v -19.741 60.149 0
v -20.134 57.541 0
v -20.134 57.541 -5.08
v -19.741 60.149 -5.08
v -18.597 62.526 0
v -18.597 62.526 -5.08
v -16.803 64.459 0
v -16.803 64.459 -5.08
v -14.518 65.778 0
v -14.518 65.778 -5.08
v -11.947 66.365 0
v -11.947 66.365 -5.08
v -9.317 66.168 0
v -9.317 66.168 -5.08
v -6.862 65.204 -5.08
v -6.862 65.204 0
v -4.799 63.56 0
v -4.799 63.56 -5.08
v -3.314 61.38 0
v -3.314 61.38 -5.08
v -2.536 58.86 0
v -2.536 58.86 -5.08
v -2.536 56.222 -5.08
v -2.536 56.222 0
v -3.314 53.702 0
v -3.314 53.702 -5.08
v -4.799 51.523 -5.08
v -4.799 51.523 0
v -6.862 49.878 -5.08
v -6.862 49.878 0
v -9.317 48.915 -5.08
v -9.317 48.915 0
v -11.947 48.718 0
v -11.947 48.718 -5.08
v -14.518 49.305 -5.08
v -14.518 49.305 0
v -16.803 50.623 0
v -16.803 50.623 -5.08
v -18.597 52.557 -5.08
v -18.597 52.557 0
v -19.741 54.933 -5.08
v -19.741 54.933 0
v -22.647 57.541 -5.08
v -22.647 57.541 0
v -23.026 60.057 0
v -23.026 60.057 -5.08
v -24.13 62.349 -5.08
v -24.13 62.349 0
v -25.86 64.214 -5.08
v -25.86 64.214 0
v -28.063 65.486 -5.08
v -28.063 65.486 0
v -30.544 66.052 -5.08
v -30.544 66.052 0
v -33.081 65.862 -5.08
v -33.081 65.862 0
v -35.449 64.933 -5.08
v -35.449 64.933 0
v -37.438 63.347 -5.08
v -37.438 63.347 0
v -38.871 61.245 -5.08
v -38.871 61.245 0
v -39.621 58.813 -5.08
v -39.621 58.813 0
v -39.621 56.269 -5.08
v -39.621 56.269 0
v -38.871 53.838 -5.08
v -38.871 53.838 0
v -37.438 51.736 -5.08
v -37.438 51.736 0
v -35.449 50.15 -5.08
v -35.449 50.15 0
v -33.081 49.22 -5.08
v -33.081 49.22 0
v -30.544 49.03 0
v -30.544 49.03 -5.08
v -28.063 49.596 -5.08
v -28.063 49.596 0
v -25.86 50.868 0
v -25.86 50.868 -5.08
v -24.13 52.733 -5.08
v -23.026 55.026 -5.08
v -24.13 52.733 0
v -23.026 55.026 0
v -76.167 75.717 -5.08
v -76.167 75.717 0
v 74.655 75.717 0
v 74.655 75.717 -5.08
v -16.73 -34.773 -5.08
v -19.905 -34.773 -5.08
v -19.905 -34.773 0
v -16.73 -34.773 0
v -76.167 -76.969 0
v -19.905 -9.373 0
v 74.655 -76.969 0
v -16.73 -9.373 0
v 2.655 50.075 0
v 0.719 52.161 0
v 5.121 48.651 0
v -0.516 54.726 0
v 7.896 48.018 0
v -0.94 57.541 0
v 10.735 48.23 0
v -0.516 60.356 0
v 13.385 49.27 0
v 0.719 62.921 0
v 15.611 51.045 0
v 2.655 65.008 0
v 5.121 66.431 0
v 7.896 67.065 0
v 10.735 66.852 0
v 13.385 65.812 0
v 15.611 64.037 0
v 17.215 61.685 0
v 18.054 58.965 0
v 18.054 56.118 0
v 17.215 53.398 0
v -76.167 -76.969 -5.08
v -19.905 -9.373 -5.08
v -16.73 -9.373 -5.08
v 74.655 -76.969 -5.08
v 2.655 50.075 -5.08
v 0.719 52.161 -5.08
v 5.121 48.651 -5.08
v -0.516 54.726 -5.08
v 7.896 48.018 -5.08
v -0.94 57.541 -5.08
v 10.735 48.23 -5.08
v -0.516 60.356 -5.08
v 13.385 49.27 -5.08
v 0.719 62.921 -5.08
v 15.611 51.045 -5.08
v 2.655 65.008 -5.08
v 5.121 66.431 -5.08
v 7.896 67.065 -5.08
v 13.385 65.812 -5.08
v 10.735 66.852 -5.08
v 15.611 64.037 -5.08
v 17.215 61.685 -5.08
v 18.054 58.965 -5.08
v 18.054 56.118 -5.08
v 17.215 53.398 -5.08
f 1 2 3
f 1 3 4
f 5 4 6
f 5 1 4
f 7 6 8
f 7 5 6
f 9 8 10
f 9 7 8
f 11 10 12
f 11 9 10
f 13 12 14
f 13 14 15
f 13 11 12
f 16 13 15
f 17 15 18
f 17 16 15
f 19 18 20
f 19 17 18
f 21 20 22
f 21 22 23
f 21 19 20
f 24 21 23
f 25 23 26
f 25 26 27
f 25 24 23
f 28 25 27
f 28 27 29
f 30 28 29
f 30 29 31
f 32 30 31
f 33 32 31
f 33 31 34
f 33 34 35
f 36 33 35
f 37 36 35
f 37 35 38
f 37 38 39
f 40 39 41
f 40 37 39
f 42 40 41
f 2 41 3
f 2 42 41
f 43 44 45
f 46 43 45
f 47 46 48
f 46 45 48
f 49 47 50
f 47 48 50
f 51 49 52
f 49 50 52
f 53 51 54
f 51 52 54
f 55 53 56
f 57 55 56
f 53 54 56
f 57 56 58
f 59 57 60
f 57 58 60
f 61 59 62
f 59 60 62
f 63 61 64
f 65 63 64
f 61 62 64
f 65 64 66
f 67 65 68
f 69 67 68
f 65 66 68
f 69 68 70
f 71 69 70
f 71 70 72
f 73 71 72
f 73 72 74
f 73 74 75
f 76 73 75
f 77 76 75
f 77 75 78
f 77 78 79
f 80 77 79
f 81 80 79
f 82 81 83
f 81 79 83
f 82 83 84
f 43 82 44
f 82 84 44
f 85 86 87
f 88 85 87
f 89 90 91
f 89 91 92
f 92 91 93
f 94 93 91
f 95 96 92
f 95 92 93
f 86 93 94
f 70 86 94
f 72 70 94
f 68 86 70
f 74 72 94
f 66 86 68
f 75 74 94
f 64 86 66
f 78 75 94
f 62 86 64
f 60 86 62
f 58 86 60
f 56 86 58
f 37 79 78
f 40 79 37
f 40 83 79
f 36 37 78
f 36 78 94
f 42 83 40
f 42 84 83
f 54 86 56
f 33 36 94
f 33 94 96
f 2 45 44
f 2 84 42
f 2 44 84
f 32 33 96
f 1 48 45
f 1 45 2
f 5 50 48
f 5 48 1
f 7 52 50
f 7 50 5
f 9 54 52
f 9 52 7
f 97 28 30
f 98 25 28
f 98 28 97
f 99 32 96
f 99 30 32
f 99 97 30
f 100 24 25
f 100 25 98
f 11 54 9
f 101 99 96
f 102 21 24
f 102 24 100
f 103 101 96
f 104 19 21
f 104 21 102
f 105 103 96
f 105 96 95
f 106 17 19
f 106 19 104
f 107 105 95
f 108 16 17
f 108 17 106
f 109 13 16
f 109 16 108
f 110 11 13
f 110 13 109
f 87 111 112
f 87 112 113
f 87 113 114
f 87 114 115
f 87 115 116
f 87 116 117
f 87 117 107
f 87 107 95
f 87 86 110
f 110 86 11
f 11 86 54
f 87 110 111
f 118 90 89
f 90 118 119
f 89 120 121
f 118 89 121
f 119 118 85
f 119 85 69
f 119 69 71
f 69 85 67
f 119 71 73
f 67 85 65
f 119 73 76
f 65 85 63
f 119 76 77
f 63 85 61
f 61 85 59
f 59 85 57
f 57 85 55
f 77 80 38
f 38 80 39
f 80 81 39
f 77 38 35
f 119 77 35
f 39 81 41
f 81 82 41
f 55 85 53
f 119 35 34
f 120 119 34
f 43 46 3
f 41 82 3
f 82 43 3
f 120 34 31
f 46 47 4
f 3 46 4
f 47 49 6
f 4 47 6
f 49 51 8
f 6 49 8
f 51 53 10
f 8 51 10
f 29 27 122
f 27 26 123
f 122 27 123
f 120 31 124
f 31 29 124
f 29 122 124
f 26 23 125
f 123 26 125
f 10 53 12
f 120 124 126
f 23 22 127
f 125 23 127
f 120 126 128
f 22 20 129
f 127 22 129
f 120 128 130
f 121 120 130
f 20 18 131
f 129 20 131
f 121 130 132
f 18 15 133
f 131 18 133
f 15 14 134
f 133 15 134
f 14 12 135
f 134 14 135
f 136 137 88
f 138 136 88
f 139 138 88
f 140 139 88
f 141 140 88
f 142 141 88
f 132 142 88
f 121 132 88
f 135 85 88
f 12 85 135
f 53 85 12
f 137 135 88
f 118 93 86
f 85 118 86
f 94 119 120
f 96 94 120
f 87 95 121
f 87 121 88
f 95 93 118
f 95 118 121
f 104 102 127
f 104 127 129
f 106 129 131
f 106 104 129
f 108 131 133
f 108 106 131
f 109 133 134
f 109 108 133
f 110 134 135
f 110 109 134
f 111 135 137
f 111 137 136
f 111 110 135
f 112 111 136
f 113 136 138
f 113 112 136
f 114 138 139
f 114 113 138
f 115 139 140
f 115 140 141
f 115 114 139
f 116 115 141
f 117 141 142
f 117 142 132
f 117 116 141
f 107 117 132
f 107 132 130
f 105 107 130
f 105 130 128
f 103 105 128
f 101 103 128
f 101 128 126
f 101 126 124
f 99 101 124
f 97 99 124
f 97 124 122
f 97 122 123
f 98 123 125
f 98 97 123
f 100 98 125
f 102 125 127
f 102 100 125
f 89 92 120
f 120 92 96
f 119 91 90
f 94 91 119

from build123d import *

# Parameters (mm, degrees)
F0_W     = 150.821402669
F0_H     = 152.6858285069
F0_W_2   = 3.175
F0_H_2   = 25.4
F0_R     = 8.5350721602
F1_DEPTH = 5.08


with BuildPart() as f1:
    # F0 (on Top) → F1 (new body)
    with BuildSketch(Plane.XY):
        with Locations((-0.7561892271, -0.6262175739)):
            Rectangle(F0_W, F0_H)
        with Locations((-18.3173127979, -22.0731783986)):
            Rectangle(F0_W_2, F0_H_2, mode=Mode.SUBTRACT)
        with Locations((-31.1815738678, 57.5412772596)):
            Circle(F0_R, mode=Mode.SUBTRACT)
        with BuildLine():
            ThreePointArc((-2.437382494, 57.5412772596), (-11.2857981585, 48.6928615951), (-20.134213823, 57.5412772596))
            ThreePointArc((-20.134213823, 57.5412772596), (-11.2857981585, 66.3896929241), (-2.437382494, 57.5412772596))
        make_face(mode=Mode.SUBTRACT)
        with BuildLine():
            ThreePointArc((18.1603263455, 57.5412772596), (8.6099775508, 47.9909284649), (-0.9403712439, 57.5412772596))
            ThreePointArc((-0.9403712439, 57.5412772596), (8.6099775508, 67.0916260543), (18.1603263455, 57.5412772596))
        make_face(mode=Mode.SUBTRACT)
    extrude(amount=-F1_DEPTH)


solid = f1.part
